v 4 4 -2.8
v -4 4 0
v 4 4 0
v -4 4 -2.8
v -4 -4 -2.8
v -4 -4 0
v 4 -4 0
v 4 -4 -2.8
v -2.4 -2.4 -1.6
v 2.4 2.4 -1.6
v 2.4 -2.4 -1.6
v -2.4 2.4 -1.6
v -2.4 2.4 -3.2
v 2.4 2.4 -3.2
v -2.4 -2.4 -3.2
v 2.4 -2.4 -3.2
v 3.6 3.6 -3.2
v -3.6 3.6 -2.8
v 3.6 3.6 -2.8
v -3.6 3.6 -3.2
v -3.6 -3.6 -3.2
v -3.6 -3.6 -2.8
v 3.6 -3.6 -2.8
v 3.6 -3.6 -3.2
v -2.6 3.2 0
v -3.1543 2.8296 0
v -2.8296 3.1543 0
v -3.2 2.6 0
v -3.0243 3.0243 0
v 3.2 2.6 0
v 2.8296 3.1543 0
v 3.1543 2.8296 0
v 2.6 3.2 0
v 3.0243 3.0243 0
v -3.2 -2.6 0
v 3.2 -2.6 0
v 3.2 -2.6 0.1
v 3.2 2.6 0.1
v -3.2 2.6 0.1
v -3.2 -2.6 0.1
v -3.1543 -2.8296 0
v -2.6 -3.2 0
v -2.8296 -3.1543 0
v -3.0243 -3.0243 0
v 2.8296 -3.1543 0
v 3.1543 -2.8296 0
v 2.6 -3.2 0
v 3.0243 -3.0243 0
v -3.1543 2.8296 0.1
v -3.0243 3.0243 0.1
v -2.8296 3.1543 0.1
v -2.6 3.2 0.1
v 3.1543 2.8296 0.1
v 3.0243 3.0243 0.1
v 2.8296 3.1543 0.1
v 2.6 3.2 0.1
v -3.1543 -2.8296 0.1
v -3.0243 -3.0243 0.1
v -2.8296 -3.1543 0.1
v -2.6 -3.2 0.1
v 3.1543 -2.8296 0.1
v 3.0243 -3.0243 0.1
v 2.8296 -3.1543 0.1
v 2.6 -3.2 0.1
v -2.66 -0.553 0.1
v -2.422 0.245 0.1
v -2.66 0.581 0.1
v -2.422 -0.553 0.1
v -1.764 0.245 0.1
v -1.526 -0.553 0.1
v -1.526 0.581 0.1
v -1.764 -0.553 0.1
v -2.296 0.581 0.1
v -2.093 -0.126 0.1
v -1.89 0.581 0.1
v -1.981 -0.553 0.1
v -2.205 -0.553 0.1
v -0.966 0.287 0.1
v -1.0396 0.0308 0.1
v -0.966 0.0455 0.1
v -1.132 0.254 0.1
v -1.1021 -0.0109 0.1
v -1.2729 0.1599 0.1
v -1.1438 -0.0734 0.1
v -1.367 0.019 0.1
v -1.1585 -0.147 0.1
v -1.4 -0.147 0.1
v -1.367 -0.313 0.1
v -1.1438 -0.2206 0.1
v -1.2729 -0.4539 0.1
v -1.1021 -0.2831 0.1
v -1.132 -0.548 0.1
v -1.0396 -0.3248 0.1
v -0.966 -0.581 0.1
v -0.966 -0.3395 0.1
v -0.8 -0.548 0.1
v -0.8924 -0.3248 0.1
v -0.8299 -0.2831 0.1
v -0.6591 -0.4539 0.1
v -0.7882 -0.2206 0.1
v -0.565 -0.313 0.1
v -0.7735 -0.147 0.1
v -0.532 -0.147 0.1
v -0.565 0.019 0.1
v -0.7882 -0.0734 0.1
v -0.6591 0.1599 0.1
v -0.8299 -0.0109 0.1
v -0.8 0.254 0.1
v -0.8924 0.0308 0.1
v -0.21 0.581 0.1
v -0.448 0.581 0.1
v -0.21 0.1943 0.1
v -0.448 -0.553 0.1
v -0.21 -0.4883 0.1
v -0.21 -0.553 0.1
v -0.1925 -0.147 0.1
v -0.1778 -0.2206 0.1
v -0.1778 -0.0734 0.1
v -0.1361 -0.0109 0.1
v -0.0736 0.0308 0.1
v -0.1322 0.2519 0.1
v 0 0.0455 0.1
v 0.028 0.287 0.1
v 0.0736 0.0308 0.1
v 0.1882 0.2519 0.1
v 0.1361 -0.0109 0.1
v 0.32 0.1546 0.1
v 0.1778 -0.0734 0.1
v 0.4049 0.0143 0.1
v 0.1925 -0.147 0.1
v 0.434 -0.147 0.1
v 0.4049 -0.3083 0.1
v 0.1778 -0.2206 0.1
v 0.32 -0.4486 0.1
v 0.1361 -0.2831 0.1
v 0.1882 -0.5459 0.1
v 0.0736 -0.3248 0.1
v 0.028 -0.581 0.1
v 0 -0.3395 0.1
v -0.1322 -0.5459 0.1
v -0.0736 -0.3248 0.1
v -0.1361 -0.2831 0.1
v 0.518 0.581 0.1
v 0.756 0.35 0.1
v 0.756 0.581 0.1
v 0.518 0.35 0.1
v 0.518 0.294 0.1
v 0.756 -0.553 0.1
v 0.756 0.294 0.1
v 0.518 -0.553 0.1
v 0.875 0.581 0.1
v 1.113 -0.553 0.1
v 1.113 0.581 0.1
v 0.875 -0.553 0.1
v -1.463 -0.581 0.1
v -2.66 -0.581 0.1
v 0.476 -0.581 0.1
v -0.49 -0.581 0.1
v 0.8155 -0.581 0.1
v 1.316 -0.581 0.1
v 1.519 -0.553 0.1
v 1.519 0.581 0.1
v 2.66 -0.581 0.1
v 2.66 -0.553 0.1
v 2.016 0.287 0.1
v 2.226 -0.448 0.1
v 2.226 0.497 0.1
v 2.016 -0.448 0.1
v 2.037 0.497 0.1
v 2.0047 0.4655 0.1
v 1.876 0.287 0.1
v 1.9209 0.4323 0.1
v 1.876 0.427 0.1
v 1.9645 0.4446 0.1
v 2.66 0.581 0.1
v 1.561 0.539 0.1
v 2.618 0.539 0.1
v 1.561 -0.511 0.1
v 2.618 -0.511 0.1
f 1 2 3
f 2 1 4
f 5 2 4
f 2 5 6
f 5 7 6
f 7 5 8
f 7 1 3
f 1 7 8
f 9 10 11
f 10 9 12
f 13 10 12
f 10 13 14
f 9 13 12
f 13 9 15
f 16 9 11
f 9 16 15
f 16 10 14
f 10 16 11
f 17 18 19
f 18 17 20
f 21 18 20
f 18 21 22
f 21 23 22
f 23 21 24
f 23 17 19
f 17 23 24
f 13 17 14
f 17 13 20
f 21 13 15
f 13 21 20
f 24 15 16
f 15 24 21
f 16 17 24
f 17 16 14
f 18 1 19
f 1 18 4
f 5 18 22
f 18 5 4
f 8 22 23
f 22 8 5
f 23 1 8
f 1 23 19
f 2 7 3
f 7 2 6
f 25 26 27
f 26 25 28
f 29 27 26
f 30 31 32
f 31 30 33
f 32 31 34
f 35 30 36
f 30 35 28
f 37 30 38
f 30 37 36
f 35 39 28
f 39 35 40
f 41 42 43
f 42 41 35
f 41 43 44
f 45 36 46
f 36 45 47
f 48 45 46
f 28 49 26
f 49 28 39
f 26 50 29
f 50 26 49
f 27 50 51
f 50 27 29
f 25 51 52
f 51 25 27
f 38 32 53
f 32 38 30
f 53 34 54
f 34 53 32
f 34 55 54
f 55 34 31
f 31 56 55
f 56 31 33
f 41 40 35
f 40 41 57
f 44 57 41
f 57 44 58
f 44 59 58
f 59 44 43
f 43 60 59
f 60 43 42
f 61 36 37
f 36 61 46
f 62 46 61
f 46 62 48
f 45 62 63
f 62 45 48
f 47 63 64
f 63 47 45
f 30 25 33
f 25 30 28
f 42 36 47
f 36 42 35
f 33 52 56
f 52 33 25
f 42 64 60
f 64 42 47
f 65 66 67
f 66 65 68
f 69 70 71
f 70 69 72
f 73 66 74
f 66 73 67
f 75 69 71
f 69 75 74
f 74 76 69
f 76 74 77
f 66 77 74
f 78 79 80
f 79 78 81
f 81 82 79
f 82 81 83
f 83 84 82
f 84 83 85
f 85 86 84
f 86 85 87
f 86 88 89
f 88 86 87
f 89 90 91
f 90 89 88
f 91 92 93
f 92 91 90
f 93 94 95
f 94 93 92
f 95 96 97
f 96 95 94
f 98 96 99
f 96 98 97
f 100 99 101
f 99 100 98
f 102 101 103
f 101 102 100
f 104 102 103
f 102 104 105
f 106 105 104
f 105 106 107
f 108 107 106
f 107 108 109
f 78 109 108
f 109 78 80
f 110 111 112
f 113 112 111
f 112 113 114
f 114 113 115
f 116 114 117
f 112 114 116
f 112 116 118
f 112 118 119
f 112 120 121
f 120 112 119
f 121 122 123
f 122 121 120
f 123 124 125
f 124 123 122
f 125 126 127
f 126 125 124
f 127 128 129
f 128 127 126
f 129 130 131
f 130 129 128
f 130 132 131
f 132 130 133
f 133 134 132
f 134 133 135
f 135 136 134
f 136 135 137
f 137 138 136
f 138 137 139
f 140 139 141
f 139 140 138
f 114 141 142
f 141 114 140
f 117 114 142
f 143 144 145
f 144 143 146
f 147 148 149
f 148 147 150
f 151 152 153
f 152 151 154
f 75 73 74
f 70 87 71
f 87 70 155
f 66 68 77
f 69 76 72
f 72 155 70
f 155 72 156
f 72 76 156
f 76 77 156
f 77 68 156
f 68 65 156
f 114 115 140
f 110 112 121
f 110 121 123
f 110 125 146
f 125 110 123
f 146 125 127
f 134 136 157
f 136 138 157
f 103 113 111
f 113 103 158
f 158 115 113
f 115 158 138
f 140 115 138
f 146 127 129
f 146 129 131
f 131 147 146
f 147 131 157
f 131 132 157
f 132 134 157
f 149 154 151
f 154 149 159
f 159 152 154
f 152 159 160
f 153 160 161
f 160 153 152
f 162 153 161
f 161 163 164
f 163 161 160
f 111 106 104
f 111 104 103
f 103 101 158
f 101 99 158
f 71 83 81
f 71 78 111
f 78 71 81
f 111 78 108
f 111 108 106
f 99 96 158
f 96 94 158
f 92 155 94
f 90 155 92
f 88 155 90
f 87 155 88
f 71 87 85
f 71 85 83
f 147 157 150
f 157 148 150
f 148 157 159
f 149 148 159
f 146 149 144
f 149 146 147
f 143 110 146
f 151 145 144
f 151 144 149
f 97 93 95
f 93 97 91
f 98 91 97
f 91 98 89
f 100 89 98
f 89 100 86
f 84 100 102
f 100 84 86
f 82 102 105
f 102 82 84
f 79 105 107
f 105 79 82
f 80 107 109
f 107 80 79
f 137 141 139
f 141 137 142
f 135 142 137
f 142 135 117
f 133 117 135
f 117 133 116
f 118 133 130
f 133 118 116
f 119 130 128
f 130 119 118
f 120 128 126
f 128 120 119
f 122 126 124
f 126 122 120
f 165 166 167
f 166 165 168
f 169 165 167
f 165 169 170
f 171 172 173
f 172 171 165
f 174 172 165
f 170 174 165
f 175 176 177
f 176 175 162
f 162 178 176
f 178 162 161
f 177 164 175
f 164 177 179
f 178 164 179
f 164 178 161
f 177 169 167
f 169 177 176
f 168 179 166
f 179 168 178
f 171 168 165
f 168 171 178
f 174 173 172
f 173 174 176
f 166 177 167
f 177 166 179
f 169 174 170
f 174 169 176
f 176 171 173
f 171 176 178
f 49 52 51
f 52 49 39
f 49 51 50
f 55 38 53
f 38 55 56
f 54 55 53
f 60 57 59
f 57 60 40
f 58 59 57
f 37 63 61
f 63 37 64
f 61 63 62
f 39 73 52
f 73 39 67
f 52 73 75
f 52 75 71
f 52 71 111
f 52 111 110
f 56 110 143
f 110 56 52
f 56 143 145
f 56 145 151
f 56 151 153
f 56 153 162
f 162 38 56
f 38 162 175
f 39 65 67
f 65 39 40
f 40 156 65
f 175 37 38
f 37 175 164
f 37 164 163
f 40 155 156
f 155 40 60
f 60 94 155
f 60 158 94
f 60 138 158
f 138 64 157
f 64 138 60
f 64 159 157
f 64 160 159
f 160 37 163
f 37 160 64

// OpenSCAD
// file: ../p/box3u12.scad
use <../lib.scad>
function ldraw_lib__box3u12() = [
// 0 Box with 3 Parallel Faces without Any Edges
// 0 Name: box3u12.dat
// 0 Author: J.C. Tchang [tchang]
// 0 !LDRAW_ORG Primitive UPDATE 2014-02
// 0 !LICENSE Licensed under CC BY 4.0 : see CAreadme.txt
// 
// 0 BFC CERTIFY CCW
  [0,"BFC","CERTIFY"],
  [0,"BFC","CCW"],
// 
// 0 !HISTORY 2014-12-23 [PTadmin] Official Update 2014-02
// 
// 
// 4 16 -1 1 1 1 1 1 1 1 -1 -1 1 -1
  [4,16,-1,1,1,1,1,1,1,1,-1,-1,1,-1],
// 4 16 -1 1 1 -1 0 1 1 0 1 1 1 1
  [4,16,-1,1,1,-1,0,1,1,0,1,1,1,1],
// 4 16 1 1 -1 1 0 -1 -1 0 -1 -1 1 -1
  [4,16,1,1,-1,1,0,-1,-1,0,-1,-1,1,-1],
];
module ldraw_lib__box3u12(step=0, col=false, unit=2/5, alt=false, line=0.2, solid=!$preview)
    makepoly(ldraw_lib__box3u12(), step=step, col=col, unit=unit, alt=alt, line=line, solid=solid);
ldraw_lib__box3u12(line=0.2);
// file: ../p/1-4cyli.scad
use <../lib.scad>
function ldraw_lib__1_4cyli() = [
// 0 Cylinder 0.25
// 0 Name: 1-4cyli.dat
// 0 Author: James Jessiman
// 0 !LDRAW_ORG Primitive UPDATE 2012-01
// 0 !LICENSE Licensed under CC BY 4.0 : see CAreadme.txt
// 
// 0 BFC CERTIFY CCW
  [0,"BFC","CERTIFY"],
  [0,"BFC","CCW"],
// 
// 0 !HISTORY 2002-03-23 [sbliss] Added BFC statement.
// 0 !HISTORY 2002-04-25 [PTadmin] Official Update 2002-02
// 0 !HISTORY 2007-06-22 [PTadmin] Header formatted for Contributor Agreement
// 0 !HISTORY 2008-07-01 [PTadmin] Official Update 2008-01
// 0 !HISTORY 2012-02-16 [Philo] Changed to CCW
// 0 !HISTORY 2012-03-30 [PTadmin] Official Update 2012-01
// 
// 
// 4 16 1 1 0 0.9239 1 0.3827 0.9239 0 0.3827 1 0 0
  [4,16,1,1,0,0.9239,1,0.3827,0.9239,0,0.3827,1,0,0],
// 5 24 1 0 0 1 1 0 0.9239 0 0.3827 1 0 -1
  [5,24,1,0,0,1,1,0,0.9239,0,0.3827,1,0,-1],
// 4 16 0.9239 1 0.3827 0.7071 1 0.7071 0.7071 0 0.7071 0.9239 0 0.3827
  [4,16,0.9239,1,0.3827,0.7071,1,0.7071,0.7071,0,0.7071,0.9239,0,0.3827],
// 5 24 0.9239 0 0.3827 0.9239 1 0.3827 0.7071 0 0.7071 1 0 0
  [5,24,0.9239,0,0.3827,0.9239,1,0.3827,0.7071,0,0.7071,1,0,0],
// 4 16 0.7071 1 0.7071 0.3827 1 0.9239 0.3827 0 0.9239 0.7071 0 0.7071
  [4,16,0.7071,1,0.7071,0.3827,1,0.9239,0.3827,0,0.9239,0.7071,0,0.7071],
// 5 24 0.7071 0 0.7071 0.7071 1 0.7071 0.3827 0 0.9239 0.9239 0 0.3827
  [5,24,0.7071,0,0.7071,0.7071,1,0.7071,0.3827,0,0.9239,0.9239,0,0.3827],
// 4 16 0.3827 1 0.9239 0 1 1 0 0 1 0.3827 0 0.9239
  [4,16,0.3827,1,0.9239,0,1,1,0,0,1,0.3827,0,0.9239],
// 5 24 0.3827 0 0.9239 0.3827 1 0.9239 0 0 1 0.7071 0 0.7071
  [5,24,0.3827,0,0.9239,0.3827,1,0.9239,0,0,1,0.7071,0,0.7071],
// 5 24 0 0 1 0 1 1 0.3827 0 0.9239 -1 0 1
  [5,24,0,0,1,0,1,1,0.3827,0,0.9239,-1,0,1],
];
module ldraw_lib__1_4cyli(step=0, col=false, unit=2/5, alt=false, line=0.2, solid=!$preview)
    makepoly(ldraw_lib__1_4cyli(), step=step, col=col, unit=unit, alt=alt, line=line, solid=solid);
ldraw_lib__1_4cyli(line=0.2);
// file: ../p/box5.scad
use <../lib.scad>
function ldraw_lib__box5() = [
// 0 Box with 5 Faces and All Edges
// 0 Name: box5.dat
// 0 Author: James Jessiman
// 0 !LDRAW_ORG Primitive UPDATE 2012-01
// 0 !LICENSE Licensed under CC BY 4.0 : see CAreadme.txt
// 
// 0 BFC CERTIFY CCW
  [0,"BFC","CERTIFY"],
  [0,"BFC","CCW"],
// 
// 0 !HISTORY 2002-04-03 [sbliss] Modified for BFC compliance
// 0 !HISTORY 2002-04-25 [PTadmin] Official Update 2002-02
// 0 !HISTORY 2007-06-24 [PTadmin] Header formatted for Contributor Agreement
// 0 !HISTORY 2008-07-01 [PTadmin] Official Update 2008-01
// 0 !HISTORY 2012-02-16 [Philo] Changed to CCW
// 0 !HISTORY 2012-03-30 [PTadmin] Official Update 2012-01
// 
// 
// 2 24 1 1 1 -1 1 1
  [2,24,1,1,1,-1,1,1],
// 2 24 -1 1 1 -1 1 -1
  [2,24,-1,1,1,-1,1,-1],
// 2 24 -1 1 -1 1 1 -1
  [2,24,-1,1,-1,1,1,-1],
// 2 24 1 1 -1 1 1 1
  [2,24,1,1,-1,1,1,1],
// 2 24 1 0 1 -1 0 1
  [2,24,1,0,1,-1,0,1],
// 2 24 -1 0 1 -1 0 -1
  [2,24,-1,0,1,-1,0,-1],
// 2 24 -1 0 -1 1 0 -1
  [2,24,-1,0,-1,1,0,-1],
// 2 24 1 0 -1 1 0 1
  [2,24,1,0,-1,1,0,1],
// 2 24 1 0 1 1 1 1
  [2,24,1,0,1,1,1,1],
// 2 24 -1 0 1 -1 1 1
  [2,24,-1,0,1,-1,1,1],
// 2 24 1 0 -1 1 1 -1
  [2,24,1,0,-1,1,1,-1],
// 2 24 -1 0 -1 -1 1 -1
  [2,24,-1,0,-1,-1,1,-1],
// 4 16 -1 1 1 1 1 1 1 1 -1 -1 1 -1
  [4,16,-1,1,1,1,1,1,1,1,-1,-1,1,-1],
// 4 16 -1 1 1 -1 0 1 1 0 1 1 1 1
  [4,16,-1,1,1,-1,0,1,1,0,1,1,1,1],
// 4 16 -1 1 -1 -1 0 -1 -1 0 1 -1 1 1
  [4,16,-1,1,-1,-1,0,-1,-1,0,1,-1,1,1],
// 4 16 1 1 -1 1 0 -1 -1 0 -1 -1 1 -1
  [4,16,1,1,-1,1,0,-1,-1,0,-1,-1,1,-1],
// 4 16 1 1 1 1 0 1 1 0 -1 1 1 -1
  [4,16,1,1,1,1,0,1,1,0,-1,1,1,-1],
];
module ldraw_lib__box5(step=0, col=false, unit=2/5, alt=false, line=0.2, solid=!$preview)
    makepoly(ldraw_lib__box5(), step=step, col=col, unit=unit, alt=alt, line=line, solid=solid);
ldraw_lib__box5(line=0.2);
// file: ../p/box4.scad
use <../lib.scad>
function ldraw_lib__box4() = [
// 0 Box with 4 Faces (2 Parallel Pairs) and All Edges
// 0 Name: box4.dat
// 0 Author: James Jessiman
// 0 !LDRAW_ORG Primitive UPDATE 2012-01
// 0 !LICENSE Licensed under CC BY 4.0 : see CAreadme.txt
// 
// 0 BFC CERTIFY CCW
  [0,"BFC","CERTIFY"],
  [0,"BFC","CCW"],
// 
// 0 !HISTORY 2002-04-03 [sbliss] Modified for BFC compliance
// 0 !HISTORY 2002-04-25 [PTadmin] Official Update 2002-02
// 0 !HISTORY 2007-06-24 [PTadmin] Header formatted for Contributor Agreement
// 0 !HISTORY 2008-07-01 [PTadmin] Official Update 2008-01
// 0 !HISTORY 2012-02-16 [Philo] Changed to CCW
// 0 !HISTORY 2012-03-30 [PTadmin] Official Update 2012-01
// 
// 
// 2 24 1 1 1 -1 1 1
  [2,24,1,1,1,-1,1,1],
// 2 24 -1 1 1 -1 1 -1
  [2,24,-1,1,1,-1,1,-1],
// 2 24 -1 1 -1 1 1 -1
  [2,24,-1,1,-1,1,1,-1],
// 2 24 1 1 -1 1 1 1
  [2,24,1,1,-1,1,1,1],
// 2 24 1 0 1 -1 0 1
  [2,24,1,0,1,-1,0,1],
// 2 24 -1 0 1 -1 0 -1
  [2,24,-1,0,1,-1,0,-1],
// 2 24 -1 0 -1 1 0 -1
  [2,24,-1,0,-1,1,0,-1],
// 2 24 1 0 -1 1 0 1
  [2,24,1,0,-1,1,0,1],
// 2 24 1 0 1 1 1 1
  [2,24,1,0,1,1,1,1],
// 2 24 -1 0 1 -1 1 1
  [2,24,-1,0,1,-1,1,1],
// 2 24 1 0 -1 1 1 -1
  [2,24,1,0,-1,1,1,-1],
// 2 24 -1 0 -1 -1 1 -1
  [2,24,-1,0,-1,-1,1,-1],
// 4 16 -1 1 1 -1 0 1 1 0 1 1 1 1
  [4,16,-1,1,1,-1,0,1,1,0,1,1,1,1],
// 4 16 -1 1 -1 -1 0 -1 -1 0 1 -1 1 1
  [4,16,-1,1,-1,-1,0,-1,-1,0,1,-1,1,1],
// 4 16 1 1 -1 1 0 -1 -1 0 -1 -1 1 -1
  [4,16,1,1,-1,1,0,-1,-1,0,-1,-1,1,-1],
// 4 16 1 1 1 1 0 1 1 0 -1 1 1 -1
  [4,16,1,1,1,1,0,1,1,0,-1,1,1,-1],
];
module ldraw_lib__box4(step=0, col=false, unit=2/5, alt=false, line=0.2, solid=!$preview)
    makepoly(ldraw_lib__box4(), step=step, col=col, unit=unit, alt=alt, line=line, solid=solid);
ldraw_lib__box4(line=0.2);
// file: s/stickerback008x008.scad
use <../../lib.scad>
use <../../p/1-4chrd.scad>
use <../../p/1-4cyli.scad>
use <../../p/box3u12.scad>
function ldraw_lib__s__stickerback008x008() = [
// 0 ~Sticker Back  0.8 x  0.8
// 0 Name: s\stickerback008x008.dat
// 0 Author: Massimo Maso [Sirio]
// 0 !LDRAW_ORG Subpart UPDATE 2025-08
// 0 !LICENSE Licensed under CC BY 4.0 : see CAreadme.txt
// 
// 0 BFC CERTIFY CCW
  [0,"BFC","CERTIFY"],
  [0,"BFC","CCW"],
// 
// 0 !HISTORY 2025-08-31 [OrionP] Official Update 2025-08
// 
// 0 // Primitives
// 1 16 -6.5 0 6.5 -1.5 0 0 0 -1 0 0 0 1.5 1-4chrd.dat
  [1,16,-6.5,0,6.5,-1.5,0,0,0,-1,0,0,0,1.5, ldraw_lib__1_4chrd()],
// 1 16 6.5 0 6.5 1.5 0 0 0 -1 0 0 0 1.5 1-4chrd.dat
  [1,16,6.5,0,6.5,1.5,0,0,0,-1,0,0,0,1.5, ldraw_lib__1_4chrd()],
// 1 16 0 -.25 0 0 0 8 0 .25 0 6.5 0 0 box3u12.dat
  [1,16,0,-.25,0,0,0,8,0,.25,0,6.5,0,0, ldraw_lib__box3u12()],
// 1 16 -6.5 0 -6.5 -1.5 0 0 0 -1 0 0 0 -1.5 1-4chrd.dat
  [1,16,-6.5,0,-6.5,-1.5,0,0,0,-1,0,0,0,-1.5, ldraw_lib__1_4chrd()],
// 1 16 6.5 0 -6.5 1.5 0 0 0 -1 0 0 0 -1.5 1-4chrd.dat
  [1,16,6.5,0,-6.5,1.5,0,0,0,-1,0,0,0,-1.5, ldraw_lib__1_4chrd()],
// 1 16 -6.5 0 6.5 -1.5 0 0 0 -.25 0 0 0 1.5 1-4cyli.dat
  [1,16,-6.5,0,6.5,-1.5,0,0,0,-.25,0,0,0,1.5, ldraw_lib__1_4cyli()],
// 1 16 6.5 0 6.5 1.5 0 0 0 -.25 0 0 0 1.5 1-4cyli.dat
  [1,16,6.5,0,6.5,1.5,0,0,0,-.25,0,0,0,1.5, ldraw_lib__1_4cyli()],
// 1 16 -6.5 0 -6.5 -1.5 0 0 0 -.25 0 0 0 -1.5 1-4cyli.dat
  [1,16,-6.5,0,-6.5,-1.5,0,0,0,-.25,0,0,0,-1.5, ldraw_lib__1_4cyli()],
// 1 16 6.5 0 -6.5 1.5 0 0 0 -.25 0 0 0 -1.5 1-4cyli.dat
  [1,16,6.5,0,-6.5,1.5,0,0,0,-.25,0,0,0,-1.5, ldraw_lib__1_4cyli()],
// 0 // Bottom faces
// 4 16 -8 0 6.5 -6.5 0 8 6.5 0 8 8 0 6.5
  [4,16,-8,0,6.5,-6.5,0,8,6.5,0,8,8,0,6.5],
// 4 16 -8 0 -6.5 8 0 -6.5 6.5 0 -8 -6.5 0 -8
  [4,16,-8,0,-6.5,8,0,-6.5,6.5,0,-8,-6.5,0,-8],
// 0 // Lateral faces
// 4 16 -6.5 0 8 -6.5 -.25 8 6.5 -.25 8 6.5 0 8
  [4,16,-6.5,0,8,-6.5,-.25,8,6.5,-.25,8,6.5,0,8],
// 4 16 -6.5 0 -8 6.5 0 -8 6.5 -.25 -8 -6.5 -.25 -8
  [4,16,-6.5,0,-8,6.5,0,-8,6.5,-.25,-8,-6.5,-.25,-8],
];
module ldraw_lib__s__stickerback008x008(step=0, col=false, unit=2/5, alt=false, line=0.2, solid=!$preview)
    makepoly(ldraw_lib__s__stickerback008x008(), step=step, col=col, unit=unit, alt=alt, line=line, solid=solid);
ldraw_lib__s__stickerback008x008(line=0.2);
// file: ../p/logo-mobil1-text.scad
use <../lib.scad>
function ldraw_lib__logo_mobil1_text() = [
// 0 Logo Mobil without Number Monocolor
// 0 Name: logo-mobil1-text.dat
// 0 Author: Massimo Maso [Sirio]
// 0 !LDRAW_ORG Primitive UPDATE 2025-03
// 0 !LICENSE Licensed under CC BY 4.0 : see CAreadme.txt
// 
// 0 !HELP Exact dimensions X = 3.8; Z = 0.83
// 
// 0 BFC CERTIFY CCW
  [0,"BFC","CERTIFY"],
  [0,"BFC","CCW"],
// 
// 0 !HISTORY 2025-03-30 [OrionP] Official Update 2025-03
// 
// 0 // Text "Mobil1"
// 0 // Letter "M"
// 4 16 -1.73 0 .175 -1.9 0 .415 -1.9 0 -.395 -1.73 0 -.395
  [4,16,-1.73,0,.175,-1.9,0,.415,-1.9,0,-.395,-1.73,0,-.395],
// 4 16 -1.26 0 .175 -1.26 0 -.395 -1.09 0 -.395 -1.09 0 .415
  [4,16,-1.26,0,.175,-1.26,0,-.395,-1.09,0,-.395,-1.09,0,.415],
// 4 16 -1.73 0 .175 -1.495 0 -.09 -1.64 0 .415 -1.9 0 .415
  [4,16,-1.73,0,.175,-1.495,0,-.09,-1.64,0,.415,-1.9,0,.415],
// 4 16 -1.26 0 .175 -1.09 0 .415 -1.35 0 .415 -1.495 0 -.09
  [4,16,-1.26,0,.175,-1.09,0,.415,-1.35,0,.415,-1.495,0,-.09],
// 4 16 -1.415 0 -.395 -1.26 0 .175 -1.495 0 -.09 -1.575 0 -.395
  [4,16,-1.415,0,-.395,-1.26,0,.175,-1.495,0,-.09,-1.575,0,-.395],
// 3 16 -1.73 0 .175 -1.575 0 -.395 -1.495 0 -.09
  [3,16,-1.73,0,.175,-1.575,0,-.395,-1.495,0,-.09],
// 0 // Letter "o"
// 4 16 -.69 0 .0325 -.69 0 .205 -.8086 0 .1814 -.7426 0 .022
  [4,16,-.69,0,.0325,-.69,0,.205,-.8086,0,.1814,-.7426,0,.022],
// 4 16 -.7426 0 .022 -.8086 0 .1814 -.9092 0 .1142 -.7872 0 -.0078
  [4,16,-.7426,0,.022,-.8086,0,.1814,-.9092,0,.1142,-.7872,0,-.0078],
// 4 16 -.7872 0 -.0078 -.9092 0 .1142 -.9764 0 .0136 -.817 0 -.0524
  [4,16,-.7872,0,-.0078,-.9092,0,.1142,-.9764,0,.0136,-.817,0,-.0524],
// 4 16 -.817 0 -.0524 -.9764 0 .0136 -1 0 -.105 -.8275 0 -.105
  [4,16,-.817,0,-.0524,-.9764,0,.0136,-1,0,-.105,-.8275,0,-.105],
// 4 16 -.8275 0 -.105 -1 0 -.105 -.9764 0 -.2236 -.817 0 -.1576
  [4,16,-.8275,0,-.105,-1,0,-.105,-.9764,0,-.2236,-.817,0,-.1576],
// 4 16 -.817 0 -.1576 -.9764 0 -.2236 -.9092 0 -.3242 -.7872 0 -.2022
  [4,16,-.817,0,-.1576,-.9764,0,-.2236,-.9092,0,-.3242,-.7872,0,-.2022],
// 4 16 -.7872 0 -.2022 -.9092 0 -.3242 -.8086 0 -.3914 -.7426 0 -.232
  [4,16,-.7872,0,-.2022,-.9092,0,-.3242,-.8086,0,-.3914,-.7426,0,-.232],
// 4 16 -.7426 0 -.232 -.8086 0 -.3914 -.69 0 -.415 -.69 0 -.2425
  [4,16,-.7426,0,-.232,-.8086,0,-.3914,-.69,0,-.415,-.69,0,-.2425],
// 4 16 -.69 0 -.2425 -.69 0 -.415 -.5714 0 -.3914 -.6374 0 -.232
  [4,16,-.69,0,-.2425,-.69,0,-.415,-.5714,0,-.3914,-.6374,0,-.232],
// 4 16 -.6374 0 -.232 -.5714 0 -.3914 -.4708 0 -.3242 -.5928 0 -.2022
  [4,16,-.6374,0,-.232,-.5714,0,-.3914,-.4708,0,-.3242,-.5928,0,-.2022],
// 4 16 -.5928 0 -.2022 -.4708 0 -.3242 -.4036 0 -.2236 -.563 0 -.1576
  [4,16,-.5928,0,-.2022,-.4708,0,-.3242,-.4036,0,-.2236,-.563,0,-.1576],
// 4 16 -.563 0 -.1576 -.4036 0 -.2236 -.38 0 -.105 -.5525 0 -.105
  [4,16,-.563,0,-.1576,-.4036,0,-.2236,-.38,0,-.105,-.5525,0,-.105],
// 4 16 -.5525 0 -.105 -.38 0 -.105 -.4036 0 .0136 -.563 0 -.0524
  [4,16,-.5525,0,-.105,-.38,0,-.105,-.4036,0,.0136,-.563,0,-.0524],
// 4 16 -.563 0 -.0524 -.4036 0 .0136 -.4708 0 .1142 -.5928 0 -.0078
  [4,16,-.563,0,-.0524,-.4036,0,.0136,-.4708,0,.1142,-.5928,0,-.0078],
// 4 16 -.5928 0 -.0078 -.4708 0 .1142 -.5714 0 .1814 -.6374 0 .022
  [4,16,-.5928,0,-.0078,-.4708,0,.1142,-.5714,0,.1814,-.6374,0,.022],
// 4 16 -.6374 0 .022 -.5714 0 .1814 -.69 0 .205 -.69 0 .0325
  [4,16,-.6374,0,.022,-.5714,0,.1814,-.69,0,.205,-.69,0,.0325],
// 0 // Letter "b"
// 3 16 -.15 0 .415 -.32 0 .415 -.15 0 .1388
  [3,16,-.15,0,.415,-.32,0,.415,-.15,0,.1388],
// 4 16 -.32 0 .415 -.32 0 -.395 -.15 0 -.3488 -.15 0 .1388
  [4,16,-.32,0,.415,-.32,0,-.395,-.15,0,-.3488,-.15,0,.1388],
// 3 16 -.15 0 -.3488 -.32 0 -.395 -.15 0 -.395
  [3,16,-.15,0,-.3488,-.32,0,-.395,-.15,0,-.395],
// 3 16 -.1375 0 -.105 -.15 0 -.3488 -.127 0 -.1576
  [3,16,-.1375,0,-.105,-.15,0,-.3488,-.127,0,-.1576],
// 3 16 -.15 0 .1388 -.15 0 -.3488 -.1375 0 -.105
  [3,16,-.15,0,.1388,-.15,0,-.3488,-.1375,0,-.105],
// 3 16 -.15 0 .1388 -.1375 0 -.105 -.127 0 -.0524
  [3,16,-.15,0,.1388,-.1375,0,-.105,-.127,0,-.0524],
// 3 16 -.15 0 .1388 -.127 0 -.0524 -.0972 0 -.0078
  [3,16,-.15,0,.1388,-.127,0,-.0524,-.0972,0,-.0078],
// 4 16 -.15 0 .1388 -.0972 0 -.0078 -.0526 0 .022 -.0944 0 .1799
  [4,16,-.15,0,.1388,-.0972,0,-.0078,-.0526,0,.022,-.0944,0,.1799],
// 4 16 -.0944 0 .1799 -.0526 0 .022 0 0 .0325 .02 0 .205
  [4,16,-.0944,0,.1799,-.0526,0,.022,0,0,.0325,.02,0,.205],
// 4 16 .02 0 .205 0 0 .0325 .0526 0 .022 .1344 0 .1799
  [4,16,.02,0,.205,0,0,.0325,.0526,0,.022,.1344,0,.1799],
// 4 16 .1344 0 .1799 .0526 0 .022 .0972 0 -.0078 .2286 0 .1104
  [4,16,.1344,0,.1799,.0526,0,.022,.0972,0,-.0078,.2286,0,.1104],
// 4 16 .2286 0 .1104 .0972 0 -.0078 .127 0 -.0524 .2892 0 .0102
  [4,16,.2286,0,.1104,.0972,0,-.0078,.127,0,-.0524,.2892,0,.0102],
// 4 16 .2892 0 .0102 .127 0 -.0524 .1375 0 -.105 .31 0 -.105
  [4,16,.2892,0,.0102,.127,0,-.0524,.1375,0,-.105,.31,0,-.105],
// 4 16 .31 0 -.105 .1375 0 -.105 .127 0 -.1576 .2892 0 -.2202
  [4,16,.31,0,-.105,.1375,0,-.105,.127,0,-.1576,.2892,0,-.2202],
// 4 16 .2892 0 -.2202 .127 0 -.1576 .0972 0 -.2022 .2286 0 -.3204
  [4,16,.2892,0,-.2202,.127,0,-.1576,.0972,0,-.2022,.2286,0,-.3204],
// 4 16 .2286 0 -.3204 .0972 0 -.2022 .0526 0 -.232 .1344 0 -.3899
  [4,16,.2286,0,-.3204,.0972,0,-.2022,.0526,0,-.232,.1344,0,-.3899],
// 4 16 .1344 0 -.3899 .0526 0 -.232 0 0 -.2425 .02 0 -.415
  [4,16,.1344,0,-.3899,.0526,0,-.232,0,0,-.2425,.02,0,-.415],
// 4 16 .02 0 -.415 0 0 -.2425 -.0526 0 -.232 -.0944 0 -.3899
  [4,16,.02,0,-.415,0,0,-.2425,-.0526,0,-.232,-.0944,0,-.3899],
// 4 16 -.0944 0 -.3899 -.0526 0 -.232 -.0972 0 -.2022 -.15 0 -.3488
  [4,16,-.0944,0,-.3899,-.0526,0,-.232,-.0972,0,-.2022,-.15,0,-.3488],
// 3 16 -.127 0 -.1576 -.15 0 -.3488 -.0972 0 -.2022
  [3,16,-.127,0,-.1576,-.15,0,-.3488,-.0972,0,-.2022],
// 0 // Letter "i"
// 4 16 .37 0 .415 .37 0 .25 .54 0 .25 .54 0 .415
  [4,16,.37,0,.415,.37,0,.25,.54,0,.25,.54,0,.415],
// 4 16 .37 0 .21 .37 0 -.395 .54 0 -.395 .54 0 .21
  [4,16,.37,0,.21,.37,0,-.395,.54,0,-.395,.54,0,.21],
// 0 // Letter "l"
// 4 16 .625 0 .415 .625 0 -.395 .795 0 -.395 .795 0 .415
  [4,16,.625,0,.415,.625,0,-.395,.795,0,-.395,.795,0,.415],
];
module ldraw_lib__logo_mobil1_text(step=0, col=false, unit=2/5, alt=false, line=0.2, solid=!$preview)
    makepoly(ldraw_lib__logo_mobil1_text(), step=step, col=col, unit=unit, alt=alt, line=line, solid=solid);
ldraw_lib__logo_mobil1_text(line=0.2);
// file: ../p/logo-mobil1-number.scad
use <../lib.scad>
function ldraw_lib__logo_mobil1_number() = [
// 0 Logo Mobil -  1 and Frame Monocolor
// 0 Name: logo-mobil1-number.dat
// 0 Author: Massimo Maso [Sirio]
// 0 !LDRAW_ORG Primitive UPDATE 2025-03
// 0 !LICENSE Licensed under CC BY 4.0 : see CAreadme.txt
// 
// 0 !HELP Exact dimensions X = 3.8; Z = 0.83
// 
// 0 BFC CERTIFY CCW
  [0,"BFC","CERTIFY"],
  [0,"BFC","CCW"],
// 
// 0 !HISTORY 2025-03-30 [OrionP] Official Update 2025-03
// 
// 0 // Number "1"
// 4 16 1.44 0 .205 1.44 0 -.32 1.59 0 -.32 1.59 0 .355
  [4,16,1.44,0,.205,1.44,0,-.32,1.59,0,-.32,1.59,0,.355],
// 4 16 1.44 0 .205 1.59 0 .355 1.455 0 .355 1.4319 0 .3325
  [4,16,1.44,0,.205,1.59,0,.355,1.455,0,.355,1.4319,0,.3325],
// 4 16 1.3721 0 .3088 1.34 0 .305 1.34 0 .205 1.44 0 .205
  [4,16,1.3721,0,.3088,1.34,0,.305,1.34,0,.205,1.44,0,.205],
// 3 16 1.4032 0 .3176 1.3721 0 .3088 1.44 0 .205
  [3,16,1.4032,0,.3176,1.3721,0,.3088,1.44,0,.205],
// 3 16 1.4319 0 .3325 1.4032 0 .3176 1.44 0 .205
  [3,16,1.4319,0,.3325,1.4032,0,.3176,1.44,0,.205],
// 0 // Frame
// 4 16 1.085 0 .415 1.115 0 .385 1.87 0 .385 1.9 0 .415
  [4,16,1.085,0,.415,1.115,0,.385,1.87,0,.385,1.9,0,.415],
// 4 16 1.085 0 .415 1.085 0 -.395 1.115 0 -.365 1.115 0 .385
  [4,16,1.085,0,.415,1.085,0,-.395,1.115,0,-.365,1.115,0,.385],
// 4 16 1.9 0 -.395 1.9 0 .415 1.87 0 .385 1.87 0 -.365
  [4,16,1.9,0,-.395,1.9,0,.415,1.87,0,.385,1.87,0,-.365],
// 4 16 1.9 0 -.395 1.87 0 -.365 1.115 0 -.365 1.085 0 -.395
  [4,16,1.9,0,-.395,1.87,0,-.365,1.115,0,-.365,1.085,0,-.395],
];
module ldraw_lib__logo_mobil1_number(step=0, col=false, unit=2/5, alt=false, line=0.2, solid=!$preview)
    makepoly(ldraw_lib__logo_mobil1_number(), step=step, col=col, unit=unit, alt=alt, line=line, solid=solid);
ldraw_lib__logo_mobil1_number(line=0.2);
// file: ../p/logo-mobil1-number-box.scad
use <../lib.scad>
function ldraw_lib__logo_mobil1_number_box() = [
// 0 Logo Mobil Box for Number  1
// 0 Name: logo-mobil1-number-box.dat
// 0 Author: Massimo Maso [Sirio]
// 0 !LDRAW_ORG Primitive UPDATE 2025-03
// 0 !LICENSE Licensed under CC BY 4.0 : see CAreadme.txt
// 
// 0 !HELP Exact dimensions X = 3.8; Z = 0.83
// 
// 0 BFC CERTIFY CCW
  [0,"BFC","CERTIFY"],
  [0,"BFC","CCW"],
// 
// 0 !HISTORY 2025-03-30 [OrionP] Official Update 2025-03
// 
// 0 // Inner rectangle
// 4 16 1.87 0 .385 1.115 0 .385 1.455 0 .355 1.59 0 .355
  [4,16,1.87,0,.385,1.115,0,.385,1.455,0,.355,1.59,0,.355],
// 4 16 1.44 0 -.32 1.115 0 -.365 1.87 0 -.365 1.59 0 -.32
  [4,16,1.44,0,-.32,1.115,0,-.365,1.87,0,-.365,1.59,0,-.32],
// 4 16 1.44 0 -.32 1.44 0 .205 1.34 0 .205 1.115 0 -.365
  [4,16,1.44,0,-.32,1.44,0,.205,1.34,0,.205,1.115,0,-.365],
// 4 16 1.115 0 .385 1.34 0 .305 1.3721 0 .3088 1.4032 0 .3176
  [4,16,1.115,0,.385,1.34,0,.305,1.3721,0,.3088,1.4032,0,.3176],
// 4 16 1.87 0 .385 1.59 0 .355 1.59 0 -.32 1.87 0 -.365
  [4,16,1.87,0,.385,1.59,0,.355,1.59,0,-.32,1.87,0,-.365],
// 4 16 1.115 0 .385 1.4032 0 .3176 1.4319 0 .3325 1.455 0 .355
  [4,16,1.115,0,.385,1.4032,0,.3176,1.4319,0,.3325,1.455,0,.355],
// 4 16 1.34 0 .205 1.34 0 .305 1.115 0 .385 1.115 0 -.365
  [4,16,1.34,0,.205,1.34,0,.305,1.115,0,.385,1.115,0,-.365],
];
module ldraw_lib__logo_mobil1_number_box(step=0, col=false, unit=2/5, alt=false, line=0.2, solid=!$preview)
    makepoly(ldraw_lib__logo_mobil1_number_box(), step=step, col=col, unit=unit, alt=alt, line=line, solid=solid);
ldraw_lib__logo_mobil1_number_box(line=0.2);
// file: ../p/1-4chrd.scad
use <../lib.scad>
function ldraw_lib__1_4chrd() = [
// 0 Chord 0.25
// 0 Name: 1-4chrd.dat
// 0 Author: Max Martin Richter [MMR1988]
// 0 !LDRAW_ORG Primitive UPDATE 2023-05
// 0 !LICENSE Licensed under CC BY 4.0 : see CAreadme.txt
// 
// 0 BFC CERTIFY CCW
  [0,"BFC","CERTIFY"],
  [0,"BFC","CCW"],
// 
// 0 !HISTORY 2004-04-22 [PTadmin] Official Update 2004-02
// 0 !HISTORY 2007-10-09 [PTadmin] Header formatted for Contributor Agreement
// 0 !HISTORY 2008-07-01 [PTadmin] Official Update 2008-01
// 0 !HISTORY 2012-08-02 [MMR1988] Re-creation with PrimGen2 and Rectifier
// 0 !HISTORY 2012-08-09 [PTadmin] Official Update 2012-02
// 0 !HISTORY 2023-10-27 [OrionP] Change author to MMR1988 from hafhead
// 0 !HISTORY 2023-10-31 [OrionP] Official Update 2023-05
// 
// 4 16 0.9239 0 0.3827 0.3827 0 0.9239 0 0 1 1 0 0
  [4,16,0.9239,0,0.3827,0.3827,0,0.9239,0,0,1,1,0,0],
// 3 16 0.7071 0 0.7071 0.3827 0 0.9239 0.9239 0 0.3827
  [3,16,0.7071,0,0.7071,0.3827,0,0.9239,0.9239,0,0.3827],
];
module ldraw_lib__1_4chrd(step=0, col=false, unit=2/5, alt=false, line=0.2, solid=!$preview)
    makepoly(ldraw_lib__1_4chrd(), step=step, col=col, unit=unit, alt=alt, line=line, solid=solid);
ldraw_lib__1_4chrd(line=0.2);
// file: s/3070bs01.scad
use <../../lib.scad>
use <../../p/box4.scad>
use <../../p/box5.scad>
function ldraw_lib__s__3070bs01() = [
// 0 ~Tile  1 x  1 with Groove without Top Face
// 0 Name: s\3070bs01.dat
// 0 Author: Chris Dee [cwdee]
// 0 !LDRAW_ORG Subpart UPDATE 2009-02
// 0 !LICENSE Licensed under CC BY 4.0 : see CAreadme.txt
// 
// 0 BFC CERTIFY CCW
  [0,"BFC","CERTIFY"],
  [0,"BFC","CCW"],
// 
// 0 !HISTORY 2009-09-03 [PTadmin] Official Update 2009-02
// 
// 
// 1 16 0 0 0 10 0 0 0 7 0 0 0 10 box4.dat
  [1,16,0,0,0,10,0,0,0,7,0,0,0,10, ldraw_lib__box4()],
// 0 BFC INVERTNEXT
  [0,"BFC","INVERTNEXT"],
// 1 16 0 8 0 6 0 0 0 -4 0 0 0 6 box5.dat
  [1,16,0,8,0,6,0,0,0,-4,0,0,0,6, ldraw_lib__box5()],
// 1 16 0 7 0 9 0 0 0 1 0 0 0 9 box4.dat
  [1,16,0,7,0,9,0,0,0,1,0,0,0,9, ldraw_lib__box4()],
// 
// 4 16 9 8 9 6 8 6 -6 8 6 -9 8 9
  [4,16,9,8,9,6,8,6,-6,8,6,-9,8,9],
// 4 16 -9 8 9 -6 8 6 -6 8 -6 -9 8 -9
  [4,16,-9,8,9,-6,8,6,-6,8,-6,-9,8,-9],
// 4 16 -9 8 -9 -6 8 -6 6 8 -6 9 8 -9
  [4,16,-9,8,-9,-6,8,-6,6,8,-6,9,8,-9],
// 4 16 9 8 -9 6 8 -6 6 8 6 9 8 9
  [4,16,9,8,-9,6,8,-6,6,8,6,9,8,9],
// 
// 4 16 10 7 10 9 7 9 -9 7 9 -10 7 10
  [4,16,10,7,10,9,7,9,-9,7,9,-10,7,10],
// 4 16 -10 7 10 -9 7 9 -9 7 -9 -10 7 -10
  [4,16,-10,7,10,-9,7,9,-9,7,-9,-10,7,-10],
// 4 16 -10 7 -10 -9 7 -9 9 7 -9 10 7 -10
  [4,16,-10,7,-10,-9,7,-9,9,7,-9,10,7,-10],
// 4 16 10 7 -10 9 7 -9 9 7 9 10 7 10
  [4,16,10,7,-10,9,7,-9,9,7,9,10,7,10],
// 0
];
module ldraw_lib__s__3070bs01(step=0, col=false, unit=2/5, alt=false, line=0.2, solid=!$preview)
    makepoly(ldraw_lib__s__3070bs01(), step=step, col=col, unit=unit, alt=alt, line=line, solid=solid);
ldraw_lib__s__3070bs01(line=0.2);
// file: 6148328bj.scad
use <../lib.scad>
use <../p/1-4chrd.scad>
use <../p/logo-mobil1-number-box.scad>
use <../p/logo-mobil1-number.scad>
use <../p/logo-mobil1-text-box.scad>
use <../p/logo-mobil1-text.scad>
use <s/stickerback008x008.scad>
function ldraw_lib__6148328bj() = [
// 0 Sticker  0.8 x  0.8 with White Mobil 1 Logo on Black Background
// 0 Name: 6148328bj.dat
// 0 Author: Massimo Maso [Sirio]
// 0 !LDRAW_ORG Part UPDATE 2026-09
// 0 !LICENSE Licensed under CC BY 4.0 : see CAreadme.txt
// 
// 0 BFC CERTIFY CCW
  [0,"BFC","CERTIFY"],
  [0,"BFC","CCW"],
// 
// 0 !CATEGORY Sticker
// 0 !KEYWORDS 919, Bricklink 75876stk01, Brickowl 333459, Hybrid, Pit Lane
// 0 !KEYWORDS Porsche, Rebrickable 26357, set 75876, Speed Champions
// 
// 0 !HISTORY 2025-03-30 [OrionP] Official Update 2025-03
// 0 !HISTORY 2026-05-27 [MagFors] Update description
// 0 !HISTORY 2026-05-29 [KnightOfTarenta] Added Stickerback
// 0 !HISTORY 2026-09-30 [OrionP] Official Update 2026-09
// 
// 0 // Sticker Back
// 1 16 0 0 0 1 0 0 0 1 0 0 0 1 s\stickerback008x008.dat
  [1,16,0,0,0,1,0,0,0,1,0,0,0,1, ldraw_lib__s__stickerback008x008()],
// 
// 0 // Logo primitive
// 1 15 0 -.25 0 3.5 0 0 0 1 0 0 0 3.5 logo-mobil1-text.dat
  [1,15,0,-.25,0,3.5,0,0,0,1,0,0,0,3.5, ldraw_lib__logo_mobil1_text()],
// 1 0 0 -.25 0 3.5 0 0 0 1 0 0 0 3.5 logo-mobil1-text-box.dat
  [1,0,0,-.25,0,3.5,0,0,0,1,0,0,0,3.5, ldraw_lib__logo_mobil1_text_box()],
// 1 15 0 -.25 0 3.5 0 0 0 1 0 0 0 3.5 logo-mobil1-number.dat
  [1,15,0,-.25,0,3.5,0,0,0,1,0,0,0,3.5, ldraw_lib__logo_mobil1_number()],
// 1 0 0 -.25 0 3.5 0 0 0 1 0 0 0 3.5 logo-mobil1-number-box.dat
  [1,0,0,-.25,0,3.5,0,0,0,1,0,0,0,3.5, ldraw_lib__logo_mobil1_number_box()],
// 0 // Primitives
// 1 0 -6.5 -.25 6.5 -1.5 0 0 0 1 0 0 0 1.5 1-4chrd.dat
  [1,0,-6.5,-.25,6.5,-1.5,0,0,0,1,0,0,0,1.5, ldraw_lib__1_4chrd()],
// 1 0 6.5 -.25 6.5 1.5 0 0 0 1 0 0 0 1.5 1-4chrd.dat
  [1,0,6.5,-.25,6.5,1.5,0,0,0,1,0,0,0,1.5, ldraw_lib__1_4chrd()],
// 1 0 -6.5 -.25 -6.5 -1.5 0 0 0 1 0 0 0 -1.5 1-4chrd.dat
  [1,0,-6.5,-.25,-6.5,-1.5,0,0,0,1,0,0,0,-1.5, ldraw_lib__1_4chrd()],
// 1 0 6.5 -.25 -6.5 1.5 0 0 0 1 0 0 0 -1.5 1-4chrd.dat
  [1,0,6.5,-.25,-6.5,1.5,0,0,0,1,0,0,0,-1.5, ldraw_lib__1_4chrd()],
// 0 // Top faces
// 4 0 -6.5 -.25 8 -8 -.25 6.5 -6.65 -.25 1.4525 -5.74 -.25 1.4525
  [4,0,-6.5,-.25,8,-8,-.25,6.5,-6.65,-.25,1.4525,-5.74,-.25,1.4525],
// 3 0 -6.5 -.25 8 -5.74 -.25 1.4525 -4.725 -.25 1.4525
  [3,0,-6.5,-.25,8,-5.74,-.25,1.4525,-4.725,-.25,1.4525],
// 3 0 -6.5 -.25 8 -4.725 -.25 1.4525 -3.815 -.25 1.4525
  [3,0,-6.5,-.25,8,-4.725,-.25,1.4525,-3.815,-.25,1.4525],
// 3 0 -6.5 -.25 8 -3.815 -.25 1.4525 -1.12 -.25 1.4525
  [3,0,-6.5,-.25,8,-3.815,-.25,1.4525,-1.12,-.25,1.4525],
// 3 0 -6.5 -.25 8 -1.12 -.25 1.4525 -.525 -.25 1.4525
  [3,0,-6.5,-.25,8,-1.12,-.25,1.4525,-.525,-.25,1.4525],
// 4 0 -6.5 -.25 8 -.525 -.25 1.4525 1.295 -.25 1.4525 6.5 -.25 8
  [4,0,-6.5,-.25,8,-.525,-.25,1.4525,1.295,-.25,1.4525,6.5,-.25,8],
// 3 0 6.5 -.25 8 1.295 -.25 1.4525 1.89 -.25 1.4525
  [3,0,6.5,-.25,8,1.295,-.25,1.4525,1.89,-.25,1.4525],
// 3 0 6.5 -.25 8 1.89 -.25 1.4525 2.1875 -.25 1.4525
  [3,0,6.5,-.25,8,1.89,-.25,1.4525,2.1875,-.25,1.4525],
// 3 0 6.5 -.25 8 2.1875 -.25 1.4525 2.7825 -.25 1.4525
  [3,0,6.5,-.25,8,2.1875,-.25,1.4525,2.7825,-.25,1.4525],
// 3 0 6.5 -.25 8 2.7825 -.25 1.4525 3.7975 -.25 1.4525
  [3,0,6.5,-.25,8,2.7825,-.25,1.4525,3.7975,-.25,1.4525],
// 4 0 6.5 -.25 8 3.7975 -.25 1.4525 6.65 -.25 1.4525 8 -.25 6.5
  [4,0,6.5,-.25,8,3.7975,-.25,1.4525,6.65,-.25,1.4525,8,-.25,6.5],
// 4 0 -8 -.25 -6.5 -6.65 -.25 -1.3825 -6.65 -.25 1.4525 -8 -.25 6.5
  [4,0,-8,-.25,-6.5,-6.65,-.25,-1.3825,-6.65,-.25,1.4525,-8,-.25,6.5],
// 3 0 -8 -.25 -6.5 -6.65 -.25 -1.4525 -6.65 -.25 -1.3825
  [3,0,-8,-.25,-6.5,-6.65,-.25,-1.4525,-6.65,-.25,-1.3825],
// 4 0 8 -.25 -6.5 8 -.25 6.5 6.65 -.25 1.4525 6.65 -.25 -1.3825
  [4,0,8,-.25,-6.5,8,-.25,6.5,6.65,-.25,1.4525,6.65,-.25,-1.3825],
// 3 0 8 -.25 -6.5 6.65 -.25 -1.3825 6.65 -.25 -1.4525
  [3,0,8,-.25,-6.5,6.65,-.25,-1.3825,6.65,-.25,-1.4525],
// 4 0 -6.5 -.25 -8 -3.6575 -.25 -1.4525 -6.65 -.25 -1.4525 -8 -.25 -6.5
  [4,0,-6.5,-.25,-8,-3.6575,-.25,-1.4525,-6.65,-.25,-1.4525,-8,-.25,-6.5],
// 3 0 -6.5 -.25 -8 -2.415 -.25 -1.4525 -3.6575 -.25 -1.4525
  [3,0,-6.5,-.25,-8,-2.415,-.25,-1.4525,-3.6575,-.25,-1.4525],
// 3 0 -6.5 -.25 -8 -1.225 -.25 -1.4525 -2.415 -.25 -1.4525
  [3,0,-6.5,-.25,-8,-1.225,-.25,-1.4525,-2.415,-.25,-1.4525],
// 3 0 -6.5 -.25 -8 .07 -.25 -1.4525 -1.225 -.25 -1.4525
  [3,0,-6.5,-.25,-8,.07,-.25,-1.4525,-1.225,-.25,-1.4525],
// 4 0 -6.5 -.25 -8 6.5 -.25 -8 1.19 -.25 -1.4525 .07 -.25 -1.4525
  [4,0,-6.5,-.25,-8,6.5,-.25,-8,1.19,-.25,-1.4525,.07,-.25,-1.4525],
// 3 0 6.5 -.25 -8 2.03875 -.25 -1.4525 1.19 -.25 -1.4525
  [3,0,6.5,-.25,-8,2.03875,-.25,-1.4525,1.19,-.25,-1.4525],
// 3 0 6.5 -.25 -8 3.29 -.25 -1.4525 2.03875 -.25 -1.4525
  [3,0,6.5,-.25,-8,3.29,-.25,-1.4525,2.03875,-.25,-1.4525],
// 4 0 6.5 -.25 -8 8 -.25 -6.5 6.65 -.25 -1.4525 3.29 -.25 -1.4525
  [4,0,6.5,-.25,-8,8,-.25,-6.5,6.65,-.25,-1.4525,3.29,-.25,-1.4525],
];
module ldraw_lib__6148328bj(step=0, col=false, unit=2/5, alt=false, line=0.2, solid=!$preview)
    makepoly(ldraw_lib__6148328bj(), step=step, col=col, unit=unit, alt=alt, line=line, solid=solid);
ldraw_lib__6148328bj(line=0.2);
// file: 3070b.scad
use <../lib.scad>
use <s/3070bs01.scad>
function ldraw_lib__3070b() = [
// 0 Tile  1 x  1 with Groove
// 0 Name: 3070b.dat
// 0 Author: Chris Dee [cwdee]
// 0 !LDRAW_ORG Part UPDATE 2025-09
// 0 !LICENSE Licensed under CC BY 4.0 : see CAreadme.txt
// 
// 0 BFC CERTIFY CCW
  [0,"BFC","CERTIFY"],
  [0,"BFC","CCW"],
// 
// 0 !KEYWORDS BrickLink 3070
// 
// 0 !HISTORY 2009-09-03 [PTadmin] Official Update 2009-02
// 0 !HISTORY 2025-09-27 [OrionP] Changed winding to CCW
// 0 !HISTORY 2025-09-29 [OrionP] Official Update 2025-09
// 
// 1 16 0 0 0 1 0 0 0 1 0 0 0 1 s\3070bs01.dat
  [1,16,0,0,0,1,0,0,0,1,0,0,0,1, ldraw_lib__s__3070bs01()],
// 4 16 -10 0 10 -10 0 -10 10 0 -10 10 0 10
  [4,16,-10,0,10,-10,0,-10,10,0,-10,10,0,10],
// 0
];
module ldraw_lib__3070b(step=0, col=false, unit=2/5, alt=false, line=0.2, solid=!$preview)
    makepoly(ldraw_lib__3070b(), step=step, col=col, unit=unit, alt=alt, line=line, solid=solid);
ldraw_lib__3070b(line=0.2);
// main file
use <../lib.scad>
use <3070b.scad>
use <6148328bj.scad>
function ldraw_lib__3070bd09() = [
// 0 Tile  1 x  1 with White Mobil 1 Logo on Black Background Sticker
// 0 Name: 3070bd09.dat
// 0 Author: Vincent Messenet [Cheenzo]
// 0 !LDRAW_ORG Shortcut UPDATE 2026-09
// 0 !LICENSE Licensed under CC BY 4.0 : see CAreadme.txt
// 
// 0 BFC CERTIFY CCW
  [0,"BFC","CERTIFY"],
  [0,"BFC","CCW"],
// 
// 0 !CATEGORY Sticker Shortcut
// 0 !KEYWORDS Bricklink 3070pb127, Porsche 919 Hybrid and 917K Pit Lane, Set 75879
// 0 !KEYWORDS Speed Champions
// 
// 0 !HISTORY 2026-09-30 [OrionP] Official Update 2026-09
// 
// 1 16 0 0 0 1 0 0 0 1 0 0 0 1 3070b.dat
  [1,16,0,0,0,1,0,0,0,1,0,0,0,1, ldraw_lib__3070b()],
// 1 16 0 0 0 1 0 0 0 1 0 0 0 1 6148328bj.dat
  [1,16,0,0,0,1,0,0,0,1,0,0,0,1, ldraw_lib__6148328bj()],
];
module ldraw_lib__3070bd09(step=0, col=false, unit=2/5, alt=false, line=0.2, solid=!$preview)
    makepoly(ldraw_lib__3070bd09(), step=step, col=col, unit=unit, alt=alt, line=line, solid=solid);
ldraw_lib__3070bd09(line=0.2);
